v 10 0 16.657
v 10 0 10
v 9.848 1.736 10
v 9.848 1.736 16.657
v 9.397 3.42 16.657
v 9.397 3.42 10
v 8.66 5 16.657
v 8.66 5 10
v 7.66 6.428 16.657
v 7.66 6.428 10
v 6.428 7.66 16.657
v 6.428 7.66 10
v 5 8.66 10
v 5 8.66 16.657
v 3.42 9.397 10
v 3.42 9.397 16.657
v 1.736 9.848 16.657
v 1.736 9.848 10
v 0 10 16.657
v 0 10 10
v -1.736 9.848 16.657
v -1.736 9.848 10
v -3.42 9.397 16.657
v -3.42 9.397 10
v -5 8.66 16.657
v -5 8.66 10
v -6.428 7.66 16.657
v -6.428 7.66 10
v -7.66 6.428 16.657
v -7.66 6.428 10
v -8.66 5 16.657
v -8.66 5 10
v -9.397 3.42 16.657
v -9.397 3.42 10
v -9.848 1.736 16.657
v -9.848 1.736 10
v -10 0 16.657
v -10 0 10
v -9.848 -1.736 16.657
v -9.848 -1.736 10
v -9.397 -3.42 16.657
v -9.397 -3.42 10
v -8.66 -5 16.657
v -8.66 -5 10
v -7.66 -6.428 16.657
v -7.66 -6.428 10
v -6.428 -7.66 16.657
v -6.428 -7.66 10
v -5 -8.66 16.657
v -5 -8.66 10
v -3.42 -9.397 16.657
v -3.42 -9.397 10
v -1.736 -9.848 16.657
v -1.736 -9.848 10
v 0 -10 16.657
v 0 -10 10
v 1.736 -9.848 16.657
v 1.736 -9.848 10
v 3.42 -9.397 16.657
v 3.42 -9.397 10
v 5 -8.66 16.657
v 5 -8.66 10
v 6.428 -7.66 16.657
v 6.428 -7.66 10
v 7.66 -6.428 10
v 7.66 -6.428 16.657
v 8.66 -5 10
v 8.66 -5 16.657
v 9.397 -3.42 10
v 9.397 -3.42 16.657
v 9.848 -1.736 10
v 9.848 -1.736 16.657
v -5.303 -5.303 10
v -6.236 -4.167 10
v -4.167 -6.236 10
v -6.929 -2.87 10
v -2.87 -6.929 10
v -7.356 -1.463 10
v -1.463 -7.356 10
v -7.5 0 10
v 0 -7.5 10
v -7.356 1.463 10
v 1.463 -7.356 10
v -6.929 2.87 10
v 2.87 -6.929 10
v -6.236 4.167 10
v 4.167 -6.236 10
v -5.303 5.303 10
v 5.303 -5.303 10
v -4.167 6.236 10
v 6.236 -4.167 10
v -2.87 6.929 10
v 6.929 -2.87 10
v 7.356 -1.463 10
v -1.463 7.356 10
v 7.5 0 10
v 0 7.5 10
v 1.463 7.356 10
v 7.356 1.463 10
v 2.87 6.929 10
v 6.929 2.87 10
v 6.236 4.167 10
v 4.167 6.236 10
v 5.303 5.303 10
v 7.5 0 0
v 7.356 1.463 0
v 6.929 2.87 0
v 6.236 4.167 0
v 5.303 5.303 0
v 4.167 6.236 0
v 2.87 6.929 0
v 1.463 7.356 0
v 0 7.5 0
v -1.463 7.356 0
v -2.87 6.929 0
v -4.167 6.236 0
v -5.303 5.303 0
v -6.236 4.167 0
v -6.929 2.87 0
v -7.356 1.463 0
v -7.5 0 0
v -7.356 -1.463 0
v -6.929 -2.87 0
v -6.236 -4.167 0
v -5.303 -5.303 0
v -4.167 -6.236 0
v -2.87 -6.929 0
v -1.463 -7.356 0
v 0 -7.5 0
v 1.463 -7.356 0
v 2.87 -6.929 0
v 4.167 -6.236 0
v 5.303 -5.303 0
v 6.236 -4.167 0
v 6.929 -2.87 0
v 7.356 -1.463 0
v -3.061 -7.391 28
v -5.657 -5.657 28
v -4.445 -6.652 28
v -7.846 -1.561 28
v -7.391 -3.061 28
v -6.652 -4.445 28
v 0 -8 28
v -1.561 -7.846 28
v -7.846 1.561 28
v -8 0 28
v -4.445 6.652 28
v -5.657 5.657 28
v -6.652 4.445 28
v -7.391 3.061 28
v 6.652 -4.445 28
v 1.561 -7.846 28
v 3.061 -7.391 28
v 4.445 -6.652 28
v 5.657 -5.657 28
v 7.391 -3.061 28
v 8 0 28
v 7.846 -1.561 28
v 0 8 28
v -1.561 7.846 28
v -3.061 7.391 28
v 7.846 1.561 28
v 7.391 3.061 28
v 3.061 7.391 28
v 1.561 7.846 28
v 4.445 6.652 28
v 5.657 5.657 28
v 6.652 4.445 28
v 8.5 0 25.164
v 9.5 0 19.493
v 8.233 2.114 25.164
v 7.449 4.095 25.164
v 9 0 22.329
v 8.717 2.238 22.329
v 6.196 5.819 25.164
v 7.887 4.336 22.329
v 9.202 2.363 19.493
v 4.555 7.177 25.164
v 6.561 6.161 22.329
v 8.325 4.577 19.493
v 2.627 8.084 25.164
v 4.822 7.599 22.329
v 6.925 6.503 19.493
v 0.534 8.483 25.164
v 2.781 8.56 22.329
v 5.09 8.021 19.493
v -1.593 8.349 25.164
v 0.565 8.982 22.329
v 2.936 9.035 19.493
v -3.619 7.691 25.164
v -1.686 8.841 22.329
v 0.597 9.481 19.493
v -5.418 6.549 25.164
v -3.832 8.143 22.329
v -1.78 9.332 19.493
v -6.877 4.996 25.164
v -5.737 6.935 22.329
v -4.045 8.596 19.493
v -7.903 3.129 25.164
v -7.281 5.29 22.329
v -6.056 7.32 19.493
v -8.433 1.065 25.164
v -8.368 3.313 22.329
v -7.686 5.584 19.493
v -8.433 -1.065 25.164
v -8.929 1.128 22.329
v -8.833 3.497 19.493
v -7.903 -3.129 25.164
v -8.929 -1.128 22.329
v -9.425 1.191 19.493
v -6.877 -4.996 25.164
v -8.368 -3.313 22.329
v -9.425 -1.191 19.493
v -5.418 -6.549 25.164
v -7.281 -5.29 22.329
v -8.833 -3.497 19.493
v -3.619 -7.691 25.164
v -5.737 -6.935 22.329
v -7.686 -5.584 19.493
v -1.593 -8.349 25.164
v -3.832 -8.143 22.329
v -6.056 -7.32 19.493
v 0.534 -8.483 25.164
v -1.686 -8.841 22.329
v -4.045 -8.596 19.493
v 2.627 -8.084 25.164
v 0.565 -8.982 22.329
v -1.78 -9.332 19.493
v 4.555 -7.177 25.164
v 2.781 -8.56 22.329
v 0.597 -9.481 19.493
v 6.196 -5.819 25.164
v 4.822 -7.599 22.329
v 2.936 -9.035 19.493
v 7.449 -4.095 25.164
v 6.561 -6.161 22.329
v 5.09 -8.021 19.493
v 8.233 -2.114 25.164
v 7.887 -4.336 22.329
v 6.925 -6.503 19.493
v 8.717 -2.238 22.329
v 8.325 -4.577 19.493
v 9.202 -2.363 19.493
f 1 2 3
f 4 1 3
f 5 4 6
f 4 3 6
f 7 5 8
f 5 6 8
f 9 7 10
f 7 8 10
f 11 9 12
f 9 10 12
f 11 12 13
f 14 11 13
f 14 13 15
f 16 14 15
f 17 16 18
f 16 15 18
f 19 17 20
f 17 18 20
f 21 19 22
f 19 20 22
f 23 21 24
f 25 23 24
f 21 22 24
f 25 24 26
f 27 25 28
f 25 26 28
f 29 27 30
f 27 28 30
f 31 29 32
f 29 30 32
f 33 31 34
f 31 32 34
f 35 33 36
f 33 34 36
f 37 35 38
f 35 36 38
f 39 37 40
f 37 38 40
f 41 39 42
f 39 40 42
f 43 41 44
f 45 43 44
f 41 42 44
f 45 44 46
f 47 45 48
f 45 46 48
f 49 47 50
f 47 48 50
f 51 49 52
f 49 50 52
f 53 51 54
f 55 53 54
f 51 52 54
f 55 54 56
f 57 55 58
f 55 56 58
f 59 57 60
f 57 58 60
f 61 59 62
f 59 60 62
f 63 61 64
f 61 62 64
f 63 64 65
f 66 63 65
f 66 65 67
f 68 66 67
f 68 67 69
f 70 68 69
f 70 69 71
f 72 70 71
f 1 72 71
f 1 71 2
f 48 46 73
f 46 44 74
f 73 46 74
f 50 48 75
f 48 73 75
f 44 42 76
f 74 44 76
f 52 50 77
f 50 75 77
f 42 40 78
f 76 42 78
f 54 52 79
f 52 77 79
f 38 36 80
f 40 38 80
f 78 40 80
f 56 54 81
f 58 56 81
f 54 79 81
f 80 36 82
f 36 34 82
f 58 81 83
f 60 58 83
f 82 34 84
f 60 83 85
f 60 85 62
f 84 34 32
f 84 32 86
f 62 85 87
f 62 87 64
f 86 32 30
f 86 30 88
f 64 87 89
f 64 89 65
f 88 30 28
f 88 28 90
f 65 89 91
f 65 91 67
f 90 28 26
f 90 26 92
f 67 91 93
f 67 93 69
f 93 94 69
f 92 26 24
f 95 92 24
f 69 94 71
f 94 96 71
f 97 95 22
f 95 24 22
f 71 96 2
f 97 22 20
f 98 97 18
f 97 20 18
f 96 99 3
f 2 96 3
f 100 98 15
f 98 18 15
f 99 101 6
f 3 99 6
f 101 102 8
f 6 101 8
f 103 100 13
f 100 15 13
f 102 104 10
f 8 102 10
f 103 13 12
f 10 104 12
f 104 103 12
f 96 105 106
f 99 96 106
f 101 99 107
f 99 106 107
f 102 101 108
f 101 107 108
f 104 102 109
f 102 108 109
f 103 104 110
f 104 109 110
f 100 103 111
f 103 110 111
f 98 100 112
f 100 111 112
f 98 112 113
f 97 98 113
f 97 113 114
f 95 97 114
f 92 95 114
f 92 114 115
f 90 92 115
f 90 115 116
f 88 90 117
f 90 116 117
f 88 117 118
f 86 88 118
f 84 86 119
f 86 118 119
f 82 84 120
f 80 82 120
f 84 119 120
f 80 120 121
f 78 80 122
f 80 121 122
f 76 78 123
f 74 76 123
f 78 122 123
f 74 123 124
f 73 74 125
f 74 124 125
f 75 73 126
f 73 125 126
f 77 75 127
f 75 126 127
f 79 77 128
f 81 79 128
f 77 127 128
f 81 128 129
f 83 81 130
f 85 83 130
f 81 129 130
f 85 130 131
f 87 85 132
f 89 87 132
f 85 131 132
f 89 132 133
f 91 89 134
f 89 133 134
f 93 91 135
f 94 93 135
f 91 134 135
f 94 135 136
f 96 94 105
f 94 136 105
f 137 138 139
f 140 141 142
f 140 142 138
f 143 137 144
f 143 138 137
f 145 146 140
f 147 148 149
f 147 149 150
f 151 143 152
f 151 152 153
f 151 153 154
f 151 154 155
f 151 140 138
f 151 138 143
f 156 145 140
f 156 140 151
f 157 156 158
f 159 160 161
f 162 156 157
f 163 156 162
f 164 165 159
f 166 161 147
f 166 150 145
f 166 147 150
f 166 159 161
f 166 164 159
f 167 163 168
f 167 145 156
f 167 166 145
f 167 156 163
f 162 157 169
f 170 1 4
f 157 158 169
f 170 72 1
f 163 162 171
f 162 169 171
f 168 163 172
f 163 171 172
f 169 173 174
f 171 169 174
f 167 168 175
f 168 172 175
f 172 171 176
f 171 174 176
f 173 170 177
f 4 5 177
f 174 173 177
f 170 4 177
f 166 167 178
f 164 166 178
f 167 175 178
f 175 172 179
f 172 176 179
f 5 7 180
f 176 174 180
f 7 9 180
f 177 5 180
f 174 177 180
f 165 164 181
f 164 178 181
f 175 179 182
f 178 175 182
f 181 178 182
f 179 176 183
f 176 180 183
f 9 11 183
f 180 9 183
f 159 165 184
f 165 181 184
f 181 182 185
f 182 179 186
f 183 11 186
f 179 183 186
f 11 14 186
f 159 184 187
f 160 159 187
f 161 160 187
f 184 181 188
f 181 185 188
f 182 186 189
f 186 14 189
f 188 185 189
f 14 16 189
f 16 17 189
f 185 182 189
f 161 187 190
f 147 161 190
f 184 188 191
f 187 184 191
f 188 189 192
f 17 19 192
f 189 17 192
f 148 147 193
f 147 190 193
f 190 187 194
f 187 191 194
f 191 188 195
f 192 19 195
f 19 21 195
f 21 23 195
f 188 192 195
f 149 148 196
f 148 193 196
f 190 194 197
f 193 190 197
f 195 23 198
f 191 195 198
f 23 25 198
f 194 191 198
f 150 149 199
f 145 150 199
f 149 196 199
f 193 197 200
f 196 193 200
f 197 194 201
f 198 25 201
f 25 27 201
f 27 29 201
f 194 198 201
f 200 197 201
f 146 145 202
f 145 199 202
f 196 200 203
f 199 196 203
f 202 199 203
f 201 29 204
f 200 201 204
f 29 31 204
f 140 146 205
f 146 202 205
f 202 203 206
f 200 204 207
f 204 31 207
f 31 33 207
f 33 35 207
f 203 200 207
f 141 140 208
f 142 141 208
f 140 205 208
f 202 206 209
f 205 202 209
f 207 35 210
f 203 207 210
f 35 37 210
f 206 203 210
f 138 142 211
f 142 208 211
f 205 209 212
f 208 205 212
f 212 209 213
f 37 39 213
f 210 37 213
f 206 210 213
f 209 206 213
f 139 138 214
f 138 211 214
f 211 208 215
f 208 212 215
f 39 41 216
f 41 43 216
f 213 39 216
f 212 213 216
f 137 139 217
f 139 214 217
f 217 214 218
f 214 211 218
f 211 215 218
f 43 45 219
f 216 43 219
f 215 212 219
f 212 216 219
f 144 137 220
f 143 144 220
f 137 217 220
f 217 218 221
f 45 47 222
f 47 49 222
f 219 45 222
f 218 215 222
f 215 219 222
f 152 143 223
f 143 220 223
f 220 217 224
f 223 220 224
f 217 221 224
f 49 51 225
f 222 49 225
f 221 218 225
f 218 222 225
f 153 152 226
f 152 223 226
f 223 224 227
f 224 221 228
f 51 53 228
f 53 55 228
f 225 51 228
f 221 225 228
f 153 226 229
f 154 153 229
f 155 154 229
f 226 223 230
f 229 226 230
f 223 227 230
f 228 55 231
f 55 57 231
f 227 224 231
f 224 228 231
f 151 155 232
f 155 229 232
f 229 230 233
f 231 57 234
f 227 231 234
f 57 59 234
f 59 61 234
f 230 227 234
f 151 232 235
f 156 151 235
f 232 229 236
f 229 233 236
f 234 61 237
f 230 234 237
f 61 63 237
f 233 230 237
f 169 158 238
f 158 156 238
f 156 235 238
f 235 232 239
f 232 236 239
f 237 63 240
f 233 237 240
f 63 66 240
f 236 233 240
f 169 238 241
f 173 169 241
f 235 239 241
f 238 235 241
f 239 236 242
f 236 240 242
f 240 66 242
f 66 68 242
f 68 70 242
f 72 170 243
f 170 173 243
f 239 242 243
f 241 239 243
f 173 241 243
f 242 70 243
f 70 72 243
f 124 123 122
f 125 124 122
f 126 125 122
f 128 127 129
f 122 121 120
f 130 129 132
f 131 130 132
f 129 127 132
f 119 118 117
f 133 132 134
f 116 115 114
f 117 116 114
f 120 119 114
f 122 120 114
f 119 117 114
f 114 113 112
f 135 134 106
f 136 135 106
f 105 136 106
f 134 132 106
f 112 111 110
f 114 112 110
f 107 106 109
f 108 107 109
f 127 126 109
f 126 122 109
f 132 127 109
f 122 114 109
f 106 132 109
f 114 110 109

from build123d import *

# Parameters (mm, degrees)
SKETCH1_R           = 7.5
BOSS_EXTRUDE1_DEPTH = 10
SKETCH2_R           = 10
BOSS_EXTRUDE2_DEPTH = 18
CHAMFER1_SIZE       = 2
CHAMFER1_SIZE2      = 11.342563639


with BuildPart() as part:
    # Sketch1 → Boss-Extrude1 (new body)
    with BuildSketch(Plane.XY):
        Circle(SKETCH1_R)
    extrude(amount=BOSS_EXTRUDE1_DEPTH)

    # Sketch2 → Boss-Extrude2 (add)
    with BuildSketch(Plane.XY.offset(10)):
        Circle(SKETCH2_R)
    extrude(amount=BOSS_EXTRUDE2_DEPTH)

    # Chamfer1
    chamfer1_edges = [part.edges().sort_by_distance(p)[0] for p in [
        (-10, 0, 28),
    ]]
    chamfer1_side = [part.faces().sort_by_distance(p)[0] for p in [
        (0, 0, 28),
    ]]
    chamfer(chamfer1_edges, length=CHAMFER1_SIZE, length2=CHAMFER1_SIZE2, reference=chamfer1_side[0])


solid = part.part
